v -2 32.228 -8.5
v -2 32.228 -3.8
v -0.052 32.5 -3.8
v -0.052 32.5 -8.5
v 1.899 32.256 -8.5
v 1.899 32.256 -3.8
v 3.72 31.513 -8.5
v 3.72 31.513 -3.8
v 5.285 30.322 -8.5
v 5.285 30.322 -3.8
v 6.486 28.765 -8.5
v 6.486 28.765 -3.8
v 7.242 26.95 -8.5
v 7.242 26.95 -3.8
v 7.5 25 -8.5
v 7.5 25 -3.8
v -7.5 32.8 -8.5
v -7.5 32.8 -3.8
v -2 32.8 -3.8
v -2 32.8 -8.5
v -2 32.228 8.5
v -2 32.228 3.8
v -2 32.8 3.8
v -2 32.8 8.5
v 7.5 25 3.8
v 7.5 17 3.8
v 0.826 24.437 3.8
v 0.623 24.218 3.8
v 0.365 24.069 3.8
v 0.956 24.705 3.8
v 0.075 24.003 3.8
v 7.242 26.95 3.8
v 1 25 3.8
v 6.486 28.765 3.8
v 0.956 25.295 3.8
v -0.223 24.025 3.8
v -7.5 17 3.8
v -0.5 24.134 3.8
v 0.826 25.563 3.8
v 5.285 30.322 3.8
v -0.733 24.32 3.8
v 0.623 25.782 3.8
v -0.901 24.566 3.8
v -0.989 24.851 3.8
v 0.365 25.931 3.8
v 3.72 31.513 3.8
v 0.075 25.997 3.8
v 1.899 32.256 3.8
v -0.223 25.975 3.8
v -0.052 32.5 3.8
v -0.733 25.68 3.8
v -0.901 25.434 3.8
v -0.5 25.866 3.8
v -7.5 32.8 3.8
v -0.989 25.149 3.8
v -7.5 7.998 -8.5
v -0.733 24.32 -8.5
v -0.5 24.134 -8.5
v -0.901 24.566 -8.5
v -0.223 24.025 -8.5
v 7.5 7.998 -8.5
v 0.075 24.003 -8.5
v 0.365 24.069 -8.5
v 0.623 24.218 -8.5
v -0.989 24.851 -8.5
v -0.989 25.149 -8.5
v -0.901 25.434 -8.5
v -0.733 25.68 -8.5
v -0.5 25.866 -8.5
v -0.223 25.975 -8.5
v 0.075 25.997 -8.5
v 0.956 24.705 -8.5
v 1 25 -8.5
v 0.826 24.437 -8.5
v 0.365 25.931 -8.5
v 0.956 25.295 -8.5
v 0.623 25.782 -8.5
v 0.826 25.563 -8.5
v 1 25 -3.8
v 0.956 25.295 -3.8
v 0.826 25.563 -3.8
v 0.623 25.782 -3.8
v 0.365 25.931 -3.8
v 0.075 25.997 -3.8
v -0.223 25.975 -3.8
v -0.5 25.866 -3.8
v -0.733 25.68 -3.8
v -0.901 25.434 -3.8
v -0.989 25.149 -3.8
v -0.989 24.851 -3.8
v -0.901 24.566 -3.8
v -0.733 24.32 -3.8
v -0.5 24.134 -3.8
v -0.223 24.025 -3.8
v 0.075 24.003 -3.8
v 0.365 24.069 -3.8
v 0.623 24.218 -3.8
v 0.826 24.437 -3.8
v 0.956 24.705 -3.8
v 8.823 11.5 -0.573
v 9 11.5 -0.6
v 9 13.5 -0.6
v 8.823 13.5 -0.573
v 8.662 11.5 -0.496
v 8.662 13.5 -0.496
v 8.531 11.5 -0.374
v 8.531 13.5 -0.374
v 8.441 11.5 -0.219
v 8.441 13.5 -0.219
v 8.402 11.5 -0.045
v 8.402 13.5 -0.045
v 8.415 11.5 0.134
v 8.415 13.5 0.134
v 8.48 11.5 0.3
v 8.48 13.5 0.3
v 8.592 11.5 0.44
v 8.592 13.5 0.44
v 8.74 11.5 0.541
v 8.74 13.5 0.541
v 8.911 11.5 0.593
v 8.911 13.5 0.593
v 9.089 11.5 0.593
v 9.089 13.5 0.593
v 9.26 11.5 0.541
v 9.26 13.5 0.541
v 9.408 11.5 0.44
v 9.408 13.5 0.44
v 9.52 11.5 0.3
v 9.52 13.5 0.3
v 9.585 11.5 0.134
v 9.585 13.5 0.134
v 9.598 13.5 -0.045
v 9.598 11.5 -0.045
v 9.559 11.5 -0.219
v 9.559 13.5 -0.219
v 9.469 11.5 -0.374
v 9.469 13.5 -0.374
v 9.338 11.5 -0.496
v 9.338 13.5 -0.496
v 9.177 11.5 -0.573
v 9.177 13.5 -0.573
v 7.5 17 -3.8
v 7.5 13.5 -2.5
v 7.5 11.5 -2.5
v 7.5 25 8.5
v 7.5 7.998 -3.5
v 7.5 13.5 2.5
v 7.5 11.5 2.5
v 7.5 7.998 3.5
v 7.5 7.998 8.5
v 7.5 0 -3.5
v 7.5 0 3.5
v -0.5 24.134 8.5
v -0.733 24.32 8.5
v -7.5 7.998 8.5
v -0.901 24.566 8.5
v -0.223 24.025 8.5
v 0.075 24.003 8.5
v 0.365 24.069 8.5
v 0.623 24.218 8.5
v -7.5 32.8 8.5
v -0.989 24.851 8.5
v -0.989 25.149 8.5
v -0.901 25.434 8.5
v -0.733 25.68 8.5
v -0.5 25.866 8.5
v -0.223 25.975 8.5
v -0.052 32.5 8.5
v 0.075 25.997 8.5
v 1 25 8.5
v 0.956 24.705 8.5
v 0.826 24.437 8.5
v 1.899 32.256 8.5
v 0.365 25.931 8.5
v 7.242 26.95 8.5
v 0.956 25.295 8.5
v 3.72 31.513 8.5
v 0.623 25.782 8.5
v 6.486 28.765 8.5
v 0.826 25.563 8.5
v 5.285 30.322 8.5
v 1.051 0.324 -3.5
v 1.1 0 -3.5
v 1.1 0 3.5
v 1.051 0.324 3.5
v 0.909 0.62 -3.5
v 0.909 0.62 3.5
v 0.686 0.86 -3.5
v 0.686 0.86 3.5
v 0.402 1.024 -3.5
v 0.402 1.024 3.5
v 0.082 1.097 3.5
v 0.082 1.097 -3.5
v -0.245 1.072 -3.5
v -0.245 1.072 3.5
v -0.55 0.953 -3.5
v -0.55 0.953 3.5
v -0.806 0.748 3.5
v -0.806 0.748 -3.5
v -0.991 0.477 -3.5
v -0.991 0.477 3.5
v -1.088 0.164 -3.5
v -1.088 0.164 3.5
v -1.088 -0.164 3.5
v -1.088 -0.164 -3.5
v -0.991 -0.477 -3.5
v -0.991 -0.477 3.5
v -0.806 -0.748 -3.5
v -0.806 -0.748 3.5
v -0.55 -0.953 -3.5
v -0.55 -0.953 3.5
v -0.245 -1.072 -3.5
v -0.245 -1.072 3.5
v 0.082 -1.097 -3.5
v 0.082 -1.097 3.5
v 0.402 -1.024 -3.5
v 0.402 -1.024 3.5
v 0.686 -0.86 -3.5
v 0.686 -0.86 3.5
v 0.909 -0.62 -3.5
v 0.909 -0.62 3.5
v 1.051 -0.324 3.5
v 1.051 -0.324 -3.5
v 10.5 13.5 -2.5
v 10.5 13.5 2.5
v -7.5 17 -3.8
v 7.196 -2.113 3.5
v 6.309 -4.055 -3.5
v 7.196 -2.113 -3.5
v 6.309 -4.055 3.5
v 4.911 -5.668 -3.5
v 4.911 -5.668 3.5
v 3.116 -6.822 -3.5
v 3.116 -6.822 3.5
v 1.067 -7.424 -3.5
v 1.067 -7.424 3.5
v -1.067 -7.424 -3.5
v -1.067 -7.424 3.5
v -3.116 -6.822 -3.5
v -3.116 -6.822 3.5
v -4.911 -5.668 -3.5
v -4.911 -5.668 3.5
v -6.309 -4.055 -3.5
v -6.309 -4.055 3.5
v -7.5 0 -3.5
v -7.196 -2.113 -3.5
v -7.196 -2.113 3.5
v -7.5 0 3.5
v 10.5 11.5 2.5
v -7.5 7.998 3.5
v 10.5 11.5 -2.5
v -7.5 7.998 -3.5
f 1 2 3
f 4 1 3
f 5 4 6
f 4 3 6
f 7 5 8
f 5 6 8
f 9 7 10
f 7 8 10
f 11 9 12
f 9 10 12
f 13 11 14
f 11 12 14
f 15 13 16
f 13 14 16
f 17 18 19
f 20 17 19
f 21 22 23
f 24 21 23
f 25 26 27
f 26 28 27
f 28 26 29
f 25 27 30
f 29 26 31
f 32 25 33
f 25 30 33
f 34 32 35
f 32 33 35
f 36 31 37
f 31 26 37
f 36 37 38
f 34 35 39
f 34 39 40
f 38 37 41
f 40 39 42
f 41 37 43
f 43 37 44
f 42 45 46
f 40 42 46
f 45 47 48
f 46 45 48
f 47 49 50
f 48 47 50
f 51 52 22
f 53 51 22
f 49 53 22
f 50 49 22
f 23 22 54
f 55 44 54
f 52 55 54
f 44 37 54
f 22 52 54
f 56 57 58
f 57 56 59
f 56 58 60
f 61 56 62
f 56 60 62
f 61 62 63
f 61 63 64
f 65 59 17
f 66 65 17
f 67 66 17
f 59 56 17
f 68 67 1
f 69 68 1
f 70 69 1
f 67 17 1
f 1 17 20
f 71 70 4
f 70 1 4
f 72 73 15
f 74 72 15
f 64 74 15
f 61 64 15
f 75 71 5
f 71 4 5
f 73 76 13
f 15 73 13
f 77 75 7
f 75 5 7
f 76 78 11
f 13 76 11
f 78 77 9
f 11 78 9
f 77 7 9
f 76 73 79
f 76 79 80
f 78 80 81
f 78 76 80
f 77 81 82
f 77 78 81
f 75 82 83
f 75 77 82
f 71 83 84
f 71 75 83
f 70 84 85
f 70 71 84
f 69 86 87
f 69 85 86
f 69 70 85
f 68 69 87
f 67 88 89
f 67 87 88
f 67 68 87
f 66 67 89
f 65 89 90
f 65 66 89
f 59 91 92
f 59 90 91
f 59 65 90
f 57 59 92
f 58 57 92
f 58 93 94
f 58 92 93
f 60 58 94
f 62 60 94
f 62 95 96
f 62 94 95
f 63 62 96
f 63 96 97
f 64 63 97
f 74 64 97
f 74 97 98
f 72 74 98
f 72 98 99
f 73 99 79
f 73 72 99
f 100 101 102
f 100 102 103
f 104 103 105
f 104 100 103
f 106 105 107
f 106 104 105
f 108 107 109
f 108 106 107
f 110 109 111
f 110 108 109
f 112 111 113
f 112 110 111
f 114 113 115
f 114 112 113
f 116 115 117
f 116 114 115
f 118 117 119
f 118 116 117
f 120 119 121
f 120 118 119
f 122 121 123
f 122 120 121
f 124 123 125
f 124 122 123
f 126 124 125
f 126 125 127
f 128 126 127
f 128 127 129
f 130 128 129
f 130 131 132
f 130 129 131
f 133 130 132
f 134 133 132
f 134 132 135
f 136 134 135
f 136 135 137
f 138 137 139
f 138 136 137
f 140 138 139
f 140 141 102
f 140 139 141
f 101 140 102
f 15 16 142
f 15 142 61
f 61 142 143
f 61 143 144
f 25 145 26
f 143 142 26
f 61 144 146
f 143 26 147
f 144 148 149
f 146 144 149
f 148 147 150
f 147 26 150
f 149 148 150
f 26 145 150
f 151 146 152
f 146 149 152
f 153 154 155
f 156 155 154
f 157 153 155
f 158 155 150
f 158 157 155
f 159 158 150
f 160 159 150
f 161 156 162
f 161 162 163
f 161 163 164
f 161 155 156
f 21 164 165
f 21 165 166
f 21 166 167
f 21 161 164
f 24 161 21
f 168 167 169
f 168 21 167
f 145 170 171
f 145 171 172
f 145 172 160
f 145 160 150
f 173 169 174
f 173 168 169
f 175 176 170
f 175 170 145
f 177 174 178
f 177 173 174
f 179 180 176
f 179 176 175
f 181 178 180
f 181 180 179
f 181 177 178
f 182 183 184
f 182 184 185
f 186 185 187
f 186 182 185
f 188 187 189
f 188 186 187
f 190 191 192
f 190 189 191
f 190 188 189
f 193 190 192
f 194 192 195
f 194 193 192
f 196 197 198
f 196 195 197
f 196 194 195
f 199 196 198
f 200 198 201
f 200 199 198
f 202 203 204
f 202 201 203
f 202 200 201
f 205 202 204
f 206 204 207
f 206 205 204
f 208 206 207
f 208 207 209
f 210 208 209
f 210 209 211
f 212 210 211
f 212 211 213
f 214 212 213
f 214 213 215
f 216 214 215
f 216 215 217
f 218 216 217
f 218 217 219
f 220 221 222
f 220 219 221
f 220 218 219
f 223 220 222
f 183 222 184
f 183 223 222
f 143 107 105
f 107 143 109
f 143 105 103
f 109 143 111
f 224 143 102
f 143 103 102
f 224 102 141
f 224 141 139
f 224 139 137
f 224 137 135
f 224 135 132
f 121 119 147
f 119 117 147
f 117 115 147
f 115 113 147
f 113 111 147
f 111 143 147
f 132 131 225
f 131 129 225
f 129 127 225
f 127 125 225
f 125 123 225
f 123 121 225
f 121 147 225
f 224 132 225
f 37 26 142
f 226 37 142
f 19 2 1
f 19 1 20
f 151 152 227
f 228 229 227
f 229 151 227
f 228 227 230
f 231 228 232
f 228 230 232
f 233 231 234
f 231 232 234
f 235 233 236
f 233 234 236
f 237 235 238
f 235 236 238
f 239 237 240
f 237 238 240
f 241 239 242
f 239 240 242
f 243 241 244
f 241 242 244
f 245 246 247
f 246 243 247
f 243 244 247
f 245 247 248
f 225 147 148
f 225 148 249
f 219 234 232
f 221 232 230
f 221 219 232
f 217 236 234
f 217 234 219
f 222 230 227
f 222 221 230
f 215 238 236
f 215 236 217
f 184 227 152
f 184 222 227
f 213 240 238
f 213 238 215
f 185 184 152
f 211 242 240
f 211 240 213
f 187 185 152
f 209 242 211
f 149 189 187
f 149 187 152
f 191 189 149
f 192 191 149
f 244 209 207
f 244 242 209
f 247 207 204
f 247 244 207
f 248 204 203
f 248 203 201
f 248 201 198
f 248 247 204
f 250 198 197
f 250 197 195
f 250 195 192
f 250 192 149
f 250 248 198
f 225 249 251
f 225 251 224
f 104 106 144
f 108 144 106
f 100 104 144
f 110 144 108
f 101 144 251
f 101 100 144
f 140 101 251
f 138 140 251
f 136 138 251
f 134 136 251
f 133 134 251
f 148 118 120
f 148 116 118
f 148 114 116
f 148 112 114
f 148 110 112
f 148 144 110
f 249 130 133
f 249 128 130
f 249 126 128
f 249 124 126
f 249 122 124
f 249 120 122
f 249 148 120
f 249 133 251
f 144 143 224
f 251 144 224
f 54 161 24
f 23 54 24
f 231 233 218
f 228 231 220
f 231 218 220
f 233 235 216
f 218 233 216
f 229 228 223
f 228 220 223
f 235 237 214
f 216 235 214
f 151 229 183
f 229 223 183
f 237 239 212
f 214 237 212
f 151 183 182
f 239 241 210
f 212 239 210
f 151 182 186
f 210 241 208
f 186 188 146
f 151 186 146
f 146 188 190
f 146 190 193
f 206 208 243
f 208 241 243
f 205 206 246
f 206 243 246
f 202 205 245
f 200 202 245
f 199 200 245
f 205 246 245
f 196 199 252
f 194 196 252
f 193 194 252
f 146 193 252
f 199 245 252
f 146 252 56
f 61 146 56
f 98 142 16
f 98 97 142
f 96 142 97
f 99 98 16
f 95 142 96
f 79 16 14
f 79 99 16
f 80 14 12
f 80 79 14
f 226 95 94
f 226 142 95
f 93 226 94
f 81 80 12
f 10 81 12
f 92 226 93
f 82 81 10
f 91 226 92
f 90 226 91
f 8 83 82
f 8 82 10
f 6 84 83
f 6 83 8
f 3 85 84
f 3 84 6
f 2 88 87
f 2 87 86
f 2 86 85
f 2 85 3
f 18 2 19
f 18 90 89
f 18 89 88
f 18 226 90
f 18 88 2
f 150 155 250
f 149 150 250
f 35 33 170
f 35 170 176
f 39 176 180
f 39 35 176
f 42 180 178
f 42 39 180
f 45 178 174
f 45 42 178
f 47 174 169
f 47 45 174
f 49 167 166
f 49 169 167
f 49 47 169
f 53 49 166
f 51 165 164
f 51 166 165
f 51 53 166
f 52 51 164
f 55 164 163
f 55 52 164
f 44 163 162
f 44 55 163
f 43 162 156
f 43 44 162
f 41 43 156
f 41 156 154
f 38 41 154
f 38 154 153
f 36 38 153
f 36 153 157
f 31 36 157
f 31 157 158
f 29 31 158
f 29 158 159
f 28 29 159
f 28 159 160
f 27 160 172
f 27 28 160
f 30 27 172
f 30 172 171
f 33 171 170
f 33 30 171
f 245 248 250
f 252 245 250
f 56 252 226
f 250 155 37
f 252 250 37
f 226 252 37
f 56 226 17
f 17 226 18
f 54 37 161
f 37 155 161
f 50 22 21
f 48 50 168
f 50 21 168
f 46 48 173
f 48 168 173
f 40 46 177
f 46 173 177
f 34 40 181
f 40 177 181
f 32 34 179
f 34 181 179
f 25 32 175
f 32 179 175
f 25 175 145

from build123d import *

# Parameters (mm, degrees)
LINK1_BODY_DEPTH       = 8.5
TONGUE_CUT_DEPTH       = 37.789944278
TONGUE_CUT_DEPTH_BACK  = 37.789944278
SKETCH1_W              = 5.5
SKETCH1_H              = 15.998130079
SKETCH7_W              = 5.5
SKETCH7_H              = 7.8
BOSS_EXTRUDE1_DEPTH    = 8.5
SLOT_CUT_DEPTH         = 35.703602119
SLOT_CUT_DEPTH_BACK    = 35.703602119
SKETCH2_W              = 7.6
SKETCH2_H              = 18
PIN_HOLES_DEPTH        = 35.703602119
PIN_HOLES_DEPTH_BACK   = 35.703602119
SKETCH3_R              = 1.1
SKETCH3_R_2            = 1
SKETCH4_W              = 3.5
SKETCH4_H              = 2
GUIDE_BLOCK_1_DEPTH    = 2.5
CORD_GUIDES_DEPTH      = 36.473088391
CORD_GUIDES_DEPTH_BACK = 36.473088391
SKETCH6_R              = 0.6


with BuildPart() as part:
    # Link1_Outline → Link1_Body (new, symmetric)
    with BuildSketch(Plane.XY):
        with BuildLine():
            Line((-7.5, 0), (-7.5, 25))
            ThreePointArc((-7.5, 25), (0, 32.5), (7.5, 25))
            Line((7.5, 25), (7.5, 0))
            ThreePointArc((7.5, 0), (0, -7.5), (-7.5, 0))
        make_face()
    extrude(amount=LINK1_BODY_DEPTH, both=True)

    # Sketch1 → Tongue_Cut (cut, two sides: drawn at the far end of the back side and taken through both)
    with BuildSketch(Plane(origin=(7.5, 0, 0), x_dir=(0, 0, -1), z_dir=(1, 0, 0)).offset(-TONGUE_CUT_DEPTH_BACK)):
        with Locations((6.25, -0.00093496)):
            Rectangle(SKETCH1_W, SKETCH1_H)
        with Locations((-6.25, -0.00093496)):
            Rectangle(SKETCH1_W, SKETCH1_H)
    extrude(amount=TONGUE_CUT_DEPTH + TONGUE_CUT_DEPTH_BACK, mode=Mode.SUBTRACT)

    # Sketch7 → Boss-Extrude1 (add, symmetric)
    with BuildSketch(Plane.XY):
        with Locations((-4.75, 28.9)):
            Rectangle(SKETCH7_W, SKETCH7_H)
    extrude(amount=BOSS_EXTRUDE1_DEPTH, both=True)

    # Sketch2 → Slot_Cut (cut, two sides: drawn at the far end of the back side and taken through both)
    with BuildSketch(Plane(origin=(0, 0, 0), x_dir=(0, 0, -1), z_dir=(1, 0, 0)).offset(-SLOT_CUT_DEPTH_BACK)):
        with Locations((0, 26)):
            Rectangle(SKETCH2_W, SKETCH2_H)
    extrude(amount=SLOT_CUT_DEPTH + SLOT_CUT_DEPTH_BACK, mode=Mode.SUBTRACT)

    # Sketch3 → Pin_Holes (cut, two sides: drawn at the far end of the back side and taken through both)
    with BuildSketch(Plane.XY.offset(-PIN_HOLES_DEPTH_BACK)):
        Circle(SKETCH3_R)
        with Locations((0, 25)):
            Circle(SKETCH3_R_2)
    extrude(amount=PIN_HOLES_DEPTH + PIN_HOLES_DEPTH_BACK, mode=Mode.SUBTRACT)

    # Sketch4 → Guide_Block_1 (add, symmetric)
    with BuildSketch(Plane.XY):
        with Locations((8.75, 12.5)):
            Rectangle(SKETCH4_W, SKETCH4_H)
    extrude(amount=GUIDE_BLOCK_1_DEPTH, both=True)

    # Sketch6 → Cord_Guides (cut, two sides: drawn at the far end of the back side and taken through both)
    with BuildSketch(Plane(origin=(0, 0, 0), x_dir=(1, 0, 0), z_dir=(0, 1, 0)).offset(-CORD_GUIDES_DEPTH_BACK)):
        with Locations(Location((9, 0, 0), (0, 0, 90))):
            Circle(SKETCH6_R)
    extrude(amount=CORD_GUIDES_DEPTH + CORD_GUIDES_DEPTH_BACK, mode=Mode.SUBTRACT)


solid = part.part
